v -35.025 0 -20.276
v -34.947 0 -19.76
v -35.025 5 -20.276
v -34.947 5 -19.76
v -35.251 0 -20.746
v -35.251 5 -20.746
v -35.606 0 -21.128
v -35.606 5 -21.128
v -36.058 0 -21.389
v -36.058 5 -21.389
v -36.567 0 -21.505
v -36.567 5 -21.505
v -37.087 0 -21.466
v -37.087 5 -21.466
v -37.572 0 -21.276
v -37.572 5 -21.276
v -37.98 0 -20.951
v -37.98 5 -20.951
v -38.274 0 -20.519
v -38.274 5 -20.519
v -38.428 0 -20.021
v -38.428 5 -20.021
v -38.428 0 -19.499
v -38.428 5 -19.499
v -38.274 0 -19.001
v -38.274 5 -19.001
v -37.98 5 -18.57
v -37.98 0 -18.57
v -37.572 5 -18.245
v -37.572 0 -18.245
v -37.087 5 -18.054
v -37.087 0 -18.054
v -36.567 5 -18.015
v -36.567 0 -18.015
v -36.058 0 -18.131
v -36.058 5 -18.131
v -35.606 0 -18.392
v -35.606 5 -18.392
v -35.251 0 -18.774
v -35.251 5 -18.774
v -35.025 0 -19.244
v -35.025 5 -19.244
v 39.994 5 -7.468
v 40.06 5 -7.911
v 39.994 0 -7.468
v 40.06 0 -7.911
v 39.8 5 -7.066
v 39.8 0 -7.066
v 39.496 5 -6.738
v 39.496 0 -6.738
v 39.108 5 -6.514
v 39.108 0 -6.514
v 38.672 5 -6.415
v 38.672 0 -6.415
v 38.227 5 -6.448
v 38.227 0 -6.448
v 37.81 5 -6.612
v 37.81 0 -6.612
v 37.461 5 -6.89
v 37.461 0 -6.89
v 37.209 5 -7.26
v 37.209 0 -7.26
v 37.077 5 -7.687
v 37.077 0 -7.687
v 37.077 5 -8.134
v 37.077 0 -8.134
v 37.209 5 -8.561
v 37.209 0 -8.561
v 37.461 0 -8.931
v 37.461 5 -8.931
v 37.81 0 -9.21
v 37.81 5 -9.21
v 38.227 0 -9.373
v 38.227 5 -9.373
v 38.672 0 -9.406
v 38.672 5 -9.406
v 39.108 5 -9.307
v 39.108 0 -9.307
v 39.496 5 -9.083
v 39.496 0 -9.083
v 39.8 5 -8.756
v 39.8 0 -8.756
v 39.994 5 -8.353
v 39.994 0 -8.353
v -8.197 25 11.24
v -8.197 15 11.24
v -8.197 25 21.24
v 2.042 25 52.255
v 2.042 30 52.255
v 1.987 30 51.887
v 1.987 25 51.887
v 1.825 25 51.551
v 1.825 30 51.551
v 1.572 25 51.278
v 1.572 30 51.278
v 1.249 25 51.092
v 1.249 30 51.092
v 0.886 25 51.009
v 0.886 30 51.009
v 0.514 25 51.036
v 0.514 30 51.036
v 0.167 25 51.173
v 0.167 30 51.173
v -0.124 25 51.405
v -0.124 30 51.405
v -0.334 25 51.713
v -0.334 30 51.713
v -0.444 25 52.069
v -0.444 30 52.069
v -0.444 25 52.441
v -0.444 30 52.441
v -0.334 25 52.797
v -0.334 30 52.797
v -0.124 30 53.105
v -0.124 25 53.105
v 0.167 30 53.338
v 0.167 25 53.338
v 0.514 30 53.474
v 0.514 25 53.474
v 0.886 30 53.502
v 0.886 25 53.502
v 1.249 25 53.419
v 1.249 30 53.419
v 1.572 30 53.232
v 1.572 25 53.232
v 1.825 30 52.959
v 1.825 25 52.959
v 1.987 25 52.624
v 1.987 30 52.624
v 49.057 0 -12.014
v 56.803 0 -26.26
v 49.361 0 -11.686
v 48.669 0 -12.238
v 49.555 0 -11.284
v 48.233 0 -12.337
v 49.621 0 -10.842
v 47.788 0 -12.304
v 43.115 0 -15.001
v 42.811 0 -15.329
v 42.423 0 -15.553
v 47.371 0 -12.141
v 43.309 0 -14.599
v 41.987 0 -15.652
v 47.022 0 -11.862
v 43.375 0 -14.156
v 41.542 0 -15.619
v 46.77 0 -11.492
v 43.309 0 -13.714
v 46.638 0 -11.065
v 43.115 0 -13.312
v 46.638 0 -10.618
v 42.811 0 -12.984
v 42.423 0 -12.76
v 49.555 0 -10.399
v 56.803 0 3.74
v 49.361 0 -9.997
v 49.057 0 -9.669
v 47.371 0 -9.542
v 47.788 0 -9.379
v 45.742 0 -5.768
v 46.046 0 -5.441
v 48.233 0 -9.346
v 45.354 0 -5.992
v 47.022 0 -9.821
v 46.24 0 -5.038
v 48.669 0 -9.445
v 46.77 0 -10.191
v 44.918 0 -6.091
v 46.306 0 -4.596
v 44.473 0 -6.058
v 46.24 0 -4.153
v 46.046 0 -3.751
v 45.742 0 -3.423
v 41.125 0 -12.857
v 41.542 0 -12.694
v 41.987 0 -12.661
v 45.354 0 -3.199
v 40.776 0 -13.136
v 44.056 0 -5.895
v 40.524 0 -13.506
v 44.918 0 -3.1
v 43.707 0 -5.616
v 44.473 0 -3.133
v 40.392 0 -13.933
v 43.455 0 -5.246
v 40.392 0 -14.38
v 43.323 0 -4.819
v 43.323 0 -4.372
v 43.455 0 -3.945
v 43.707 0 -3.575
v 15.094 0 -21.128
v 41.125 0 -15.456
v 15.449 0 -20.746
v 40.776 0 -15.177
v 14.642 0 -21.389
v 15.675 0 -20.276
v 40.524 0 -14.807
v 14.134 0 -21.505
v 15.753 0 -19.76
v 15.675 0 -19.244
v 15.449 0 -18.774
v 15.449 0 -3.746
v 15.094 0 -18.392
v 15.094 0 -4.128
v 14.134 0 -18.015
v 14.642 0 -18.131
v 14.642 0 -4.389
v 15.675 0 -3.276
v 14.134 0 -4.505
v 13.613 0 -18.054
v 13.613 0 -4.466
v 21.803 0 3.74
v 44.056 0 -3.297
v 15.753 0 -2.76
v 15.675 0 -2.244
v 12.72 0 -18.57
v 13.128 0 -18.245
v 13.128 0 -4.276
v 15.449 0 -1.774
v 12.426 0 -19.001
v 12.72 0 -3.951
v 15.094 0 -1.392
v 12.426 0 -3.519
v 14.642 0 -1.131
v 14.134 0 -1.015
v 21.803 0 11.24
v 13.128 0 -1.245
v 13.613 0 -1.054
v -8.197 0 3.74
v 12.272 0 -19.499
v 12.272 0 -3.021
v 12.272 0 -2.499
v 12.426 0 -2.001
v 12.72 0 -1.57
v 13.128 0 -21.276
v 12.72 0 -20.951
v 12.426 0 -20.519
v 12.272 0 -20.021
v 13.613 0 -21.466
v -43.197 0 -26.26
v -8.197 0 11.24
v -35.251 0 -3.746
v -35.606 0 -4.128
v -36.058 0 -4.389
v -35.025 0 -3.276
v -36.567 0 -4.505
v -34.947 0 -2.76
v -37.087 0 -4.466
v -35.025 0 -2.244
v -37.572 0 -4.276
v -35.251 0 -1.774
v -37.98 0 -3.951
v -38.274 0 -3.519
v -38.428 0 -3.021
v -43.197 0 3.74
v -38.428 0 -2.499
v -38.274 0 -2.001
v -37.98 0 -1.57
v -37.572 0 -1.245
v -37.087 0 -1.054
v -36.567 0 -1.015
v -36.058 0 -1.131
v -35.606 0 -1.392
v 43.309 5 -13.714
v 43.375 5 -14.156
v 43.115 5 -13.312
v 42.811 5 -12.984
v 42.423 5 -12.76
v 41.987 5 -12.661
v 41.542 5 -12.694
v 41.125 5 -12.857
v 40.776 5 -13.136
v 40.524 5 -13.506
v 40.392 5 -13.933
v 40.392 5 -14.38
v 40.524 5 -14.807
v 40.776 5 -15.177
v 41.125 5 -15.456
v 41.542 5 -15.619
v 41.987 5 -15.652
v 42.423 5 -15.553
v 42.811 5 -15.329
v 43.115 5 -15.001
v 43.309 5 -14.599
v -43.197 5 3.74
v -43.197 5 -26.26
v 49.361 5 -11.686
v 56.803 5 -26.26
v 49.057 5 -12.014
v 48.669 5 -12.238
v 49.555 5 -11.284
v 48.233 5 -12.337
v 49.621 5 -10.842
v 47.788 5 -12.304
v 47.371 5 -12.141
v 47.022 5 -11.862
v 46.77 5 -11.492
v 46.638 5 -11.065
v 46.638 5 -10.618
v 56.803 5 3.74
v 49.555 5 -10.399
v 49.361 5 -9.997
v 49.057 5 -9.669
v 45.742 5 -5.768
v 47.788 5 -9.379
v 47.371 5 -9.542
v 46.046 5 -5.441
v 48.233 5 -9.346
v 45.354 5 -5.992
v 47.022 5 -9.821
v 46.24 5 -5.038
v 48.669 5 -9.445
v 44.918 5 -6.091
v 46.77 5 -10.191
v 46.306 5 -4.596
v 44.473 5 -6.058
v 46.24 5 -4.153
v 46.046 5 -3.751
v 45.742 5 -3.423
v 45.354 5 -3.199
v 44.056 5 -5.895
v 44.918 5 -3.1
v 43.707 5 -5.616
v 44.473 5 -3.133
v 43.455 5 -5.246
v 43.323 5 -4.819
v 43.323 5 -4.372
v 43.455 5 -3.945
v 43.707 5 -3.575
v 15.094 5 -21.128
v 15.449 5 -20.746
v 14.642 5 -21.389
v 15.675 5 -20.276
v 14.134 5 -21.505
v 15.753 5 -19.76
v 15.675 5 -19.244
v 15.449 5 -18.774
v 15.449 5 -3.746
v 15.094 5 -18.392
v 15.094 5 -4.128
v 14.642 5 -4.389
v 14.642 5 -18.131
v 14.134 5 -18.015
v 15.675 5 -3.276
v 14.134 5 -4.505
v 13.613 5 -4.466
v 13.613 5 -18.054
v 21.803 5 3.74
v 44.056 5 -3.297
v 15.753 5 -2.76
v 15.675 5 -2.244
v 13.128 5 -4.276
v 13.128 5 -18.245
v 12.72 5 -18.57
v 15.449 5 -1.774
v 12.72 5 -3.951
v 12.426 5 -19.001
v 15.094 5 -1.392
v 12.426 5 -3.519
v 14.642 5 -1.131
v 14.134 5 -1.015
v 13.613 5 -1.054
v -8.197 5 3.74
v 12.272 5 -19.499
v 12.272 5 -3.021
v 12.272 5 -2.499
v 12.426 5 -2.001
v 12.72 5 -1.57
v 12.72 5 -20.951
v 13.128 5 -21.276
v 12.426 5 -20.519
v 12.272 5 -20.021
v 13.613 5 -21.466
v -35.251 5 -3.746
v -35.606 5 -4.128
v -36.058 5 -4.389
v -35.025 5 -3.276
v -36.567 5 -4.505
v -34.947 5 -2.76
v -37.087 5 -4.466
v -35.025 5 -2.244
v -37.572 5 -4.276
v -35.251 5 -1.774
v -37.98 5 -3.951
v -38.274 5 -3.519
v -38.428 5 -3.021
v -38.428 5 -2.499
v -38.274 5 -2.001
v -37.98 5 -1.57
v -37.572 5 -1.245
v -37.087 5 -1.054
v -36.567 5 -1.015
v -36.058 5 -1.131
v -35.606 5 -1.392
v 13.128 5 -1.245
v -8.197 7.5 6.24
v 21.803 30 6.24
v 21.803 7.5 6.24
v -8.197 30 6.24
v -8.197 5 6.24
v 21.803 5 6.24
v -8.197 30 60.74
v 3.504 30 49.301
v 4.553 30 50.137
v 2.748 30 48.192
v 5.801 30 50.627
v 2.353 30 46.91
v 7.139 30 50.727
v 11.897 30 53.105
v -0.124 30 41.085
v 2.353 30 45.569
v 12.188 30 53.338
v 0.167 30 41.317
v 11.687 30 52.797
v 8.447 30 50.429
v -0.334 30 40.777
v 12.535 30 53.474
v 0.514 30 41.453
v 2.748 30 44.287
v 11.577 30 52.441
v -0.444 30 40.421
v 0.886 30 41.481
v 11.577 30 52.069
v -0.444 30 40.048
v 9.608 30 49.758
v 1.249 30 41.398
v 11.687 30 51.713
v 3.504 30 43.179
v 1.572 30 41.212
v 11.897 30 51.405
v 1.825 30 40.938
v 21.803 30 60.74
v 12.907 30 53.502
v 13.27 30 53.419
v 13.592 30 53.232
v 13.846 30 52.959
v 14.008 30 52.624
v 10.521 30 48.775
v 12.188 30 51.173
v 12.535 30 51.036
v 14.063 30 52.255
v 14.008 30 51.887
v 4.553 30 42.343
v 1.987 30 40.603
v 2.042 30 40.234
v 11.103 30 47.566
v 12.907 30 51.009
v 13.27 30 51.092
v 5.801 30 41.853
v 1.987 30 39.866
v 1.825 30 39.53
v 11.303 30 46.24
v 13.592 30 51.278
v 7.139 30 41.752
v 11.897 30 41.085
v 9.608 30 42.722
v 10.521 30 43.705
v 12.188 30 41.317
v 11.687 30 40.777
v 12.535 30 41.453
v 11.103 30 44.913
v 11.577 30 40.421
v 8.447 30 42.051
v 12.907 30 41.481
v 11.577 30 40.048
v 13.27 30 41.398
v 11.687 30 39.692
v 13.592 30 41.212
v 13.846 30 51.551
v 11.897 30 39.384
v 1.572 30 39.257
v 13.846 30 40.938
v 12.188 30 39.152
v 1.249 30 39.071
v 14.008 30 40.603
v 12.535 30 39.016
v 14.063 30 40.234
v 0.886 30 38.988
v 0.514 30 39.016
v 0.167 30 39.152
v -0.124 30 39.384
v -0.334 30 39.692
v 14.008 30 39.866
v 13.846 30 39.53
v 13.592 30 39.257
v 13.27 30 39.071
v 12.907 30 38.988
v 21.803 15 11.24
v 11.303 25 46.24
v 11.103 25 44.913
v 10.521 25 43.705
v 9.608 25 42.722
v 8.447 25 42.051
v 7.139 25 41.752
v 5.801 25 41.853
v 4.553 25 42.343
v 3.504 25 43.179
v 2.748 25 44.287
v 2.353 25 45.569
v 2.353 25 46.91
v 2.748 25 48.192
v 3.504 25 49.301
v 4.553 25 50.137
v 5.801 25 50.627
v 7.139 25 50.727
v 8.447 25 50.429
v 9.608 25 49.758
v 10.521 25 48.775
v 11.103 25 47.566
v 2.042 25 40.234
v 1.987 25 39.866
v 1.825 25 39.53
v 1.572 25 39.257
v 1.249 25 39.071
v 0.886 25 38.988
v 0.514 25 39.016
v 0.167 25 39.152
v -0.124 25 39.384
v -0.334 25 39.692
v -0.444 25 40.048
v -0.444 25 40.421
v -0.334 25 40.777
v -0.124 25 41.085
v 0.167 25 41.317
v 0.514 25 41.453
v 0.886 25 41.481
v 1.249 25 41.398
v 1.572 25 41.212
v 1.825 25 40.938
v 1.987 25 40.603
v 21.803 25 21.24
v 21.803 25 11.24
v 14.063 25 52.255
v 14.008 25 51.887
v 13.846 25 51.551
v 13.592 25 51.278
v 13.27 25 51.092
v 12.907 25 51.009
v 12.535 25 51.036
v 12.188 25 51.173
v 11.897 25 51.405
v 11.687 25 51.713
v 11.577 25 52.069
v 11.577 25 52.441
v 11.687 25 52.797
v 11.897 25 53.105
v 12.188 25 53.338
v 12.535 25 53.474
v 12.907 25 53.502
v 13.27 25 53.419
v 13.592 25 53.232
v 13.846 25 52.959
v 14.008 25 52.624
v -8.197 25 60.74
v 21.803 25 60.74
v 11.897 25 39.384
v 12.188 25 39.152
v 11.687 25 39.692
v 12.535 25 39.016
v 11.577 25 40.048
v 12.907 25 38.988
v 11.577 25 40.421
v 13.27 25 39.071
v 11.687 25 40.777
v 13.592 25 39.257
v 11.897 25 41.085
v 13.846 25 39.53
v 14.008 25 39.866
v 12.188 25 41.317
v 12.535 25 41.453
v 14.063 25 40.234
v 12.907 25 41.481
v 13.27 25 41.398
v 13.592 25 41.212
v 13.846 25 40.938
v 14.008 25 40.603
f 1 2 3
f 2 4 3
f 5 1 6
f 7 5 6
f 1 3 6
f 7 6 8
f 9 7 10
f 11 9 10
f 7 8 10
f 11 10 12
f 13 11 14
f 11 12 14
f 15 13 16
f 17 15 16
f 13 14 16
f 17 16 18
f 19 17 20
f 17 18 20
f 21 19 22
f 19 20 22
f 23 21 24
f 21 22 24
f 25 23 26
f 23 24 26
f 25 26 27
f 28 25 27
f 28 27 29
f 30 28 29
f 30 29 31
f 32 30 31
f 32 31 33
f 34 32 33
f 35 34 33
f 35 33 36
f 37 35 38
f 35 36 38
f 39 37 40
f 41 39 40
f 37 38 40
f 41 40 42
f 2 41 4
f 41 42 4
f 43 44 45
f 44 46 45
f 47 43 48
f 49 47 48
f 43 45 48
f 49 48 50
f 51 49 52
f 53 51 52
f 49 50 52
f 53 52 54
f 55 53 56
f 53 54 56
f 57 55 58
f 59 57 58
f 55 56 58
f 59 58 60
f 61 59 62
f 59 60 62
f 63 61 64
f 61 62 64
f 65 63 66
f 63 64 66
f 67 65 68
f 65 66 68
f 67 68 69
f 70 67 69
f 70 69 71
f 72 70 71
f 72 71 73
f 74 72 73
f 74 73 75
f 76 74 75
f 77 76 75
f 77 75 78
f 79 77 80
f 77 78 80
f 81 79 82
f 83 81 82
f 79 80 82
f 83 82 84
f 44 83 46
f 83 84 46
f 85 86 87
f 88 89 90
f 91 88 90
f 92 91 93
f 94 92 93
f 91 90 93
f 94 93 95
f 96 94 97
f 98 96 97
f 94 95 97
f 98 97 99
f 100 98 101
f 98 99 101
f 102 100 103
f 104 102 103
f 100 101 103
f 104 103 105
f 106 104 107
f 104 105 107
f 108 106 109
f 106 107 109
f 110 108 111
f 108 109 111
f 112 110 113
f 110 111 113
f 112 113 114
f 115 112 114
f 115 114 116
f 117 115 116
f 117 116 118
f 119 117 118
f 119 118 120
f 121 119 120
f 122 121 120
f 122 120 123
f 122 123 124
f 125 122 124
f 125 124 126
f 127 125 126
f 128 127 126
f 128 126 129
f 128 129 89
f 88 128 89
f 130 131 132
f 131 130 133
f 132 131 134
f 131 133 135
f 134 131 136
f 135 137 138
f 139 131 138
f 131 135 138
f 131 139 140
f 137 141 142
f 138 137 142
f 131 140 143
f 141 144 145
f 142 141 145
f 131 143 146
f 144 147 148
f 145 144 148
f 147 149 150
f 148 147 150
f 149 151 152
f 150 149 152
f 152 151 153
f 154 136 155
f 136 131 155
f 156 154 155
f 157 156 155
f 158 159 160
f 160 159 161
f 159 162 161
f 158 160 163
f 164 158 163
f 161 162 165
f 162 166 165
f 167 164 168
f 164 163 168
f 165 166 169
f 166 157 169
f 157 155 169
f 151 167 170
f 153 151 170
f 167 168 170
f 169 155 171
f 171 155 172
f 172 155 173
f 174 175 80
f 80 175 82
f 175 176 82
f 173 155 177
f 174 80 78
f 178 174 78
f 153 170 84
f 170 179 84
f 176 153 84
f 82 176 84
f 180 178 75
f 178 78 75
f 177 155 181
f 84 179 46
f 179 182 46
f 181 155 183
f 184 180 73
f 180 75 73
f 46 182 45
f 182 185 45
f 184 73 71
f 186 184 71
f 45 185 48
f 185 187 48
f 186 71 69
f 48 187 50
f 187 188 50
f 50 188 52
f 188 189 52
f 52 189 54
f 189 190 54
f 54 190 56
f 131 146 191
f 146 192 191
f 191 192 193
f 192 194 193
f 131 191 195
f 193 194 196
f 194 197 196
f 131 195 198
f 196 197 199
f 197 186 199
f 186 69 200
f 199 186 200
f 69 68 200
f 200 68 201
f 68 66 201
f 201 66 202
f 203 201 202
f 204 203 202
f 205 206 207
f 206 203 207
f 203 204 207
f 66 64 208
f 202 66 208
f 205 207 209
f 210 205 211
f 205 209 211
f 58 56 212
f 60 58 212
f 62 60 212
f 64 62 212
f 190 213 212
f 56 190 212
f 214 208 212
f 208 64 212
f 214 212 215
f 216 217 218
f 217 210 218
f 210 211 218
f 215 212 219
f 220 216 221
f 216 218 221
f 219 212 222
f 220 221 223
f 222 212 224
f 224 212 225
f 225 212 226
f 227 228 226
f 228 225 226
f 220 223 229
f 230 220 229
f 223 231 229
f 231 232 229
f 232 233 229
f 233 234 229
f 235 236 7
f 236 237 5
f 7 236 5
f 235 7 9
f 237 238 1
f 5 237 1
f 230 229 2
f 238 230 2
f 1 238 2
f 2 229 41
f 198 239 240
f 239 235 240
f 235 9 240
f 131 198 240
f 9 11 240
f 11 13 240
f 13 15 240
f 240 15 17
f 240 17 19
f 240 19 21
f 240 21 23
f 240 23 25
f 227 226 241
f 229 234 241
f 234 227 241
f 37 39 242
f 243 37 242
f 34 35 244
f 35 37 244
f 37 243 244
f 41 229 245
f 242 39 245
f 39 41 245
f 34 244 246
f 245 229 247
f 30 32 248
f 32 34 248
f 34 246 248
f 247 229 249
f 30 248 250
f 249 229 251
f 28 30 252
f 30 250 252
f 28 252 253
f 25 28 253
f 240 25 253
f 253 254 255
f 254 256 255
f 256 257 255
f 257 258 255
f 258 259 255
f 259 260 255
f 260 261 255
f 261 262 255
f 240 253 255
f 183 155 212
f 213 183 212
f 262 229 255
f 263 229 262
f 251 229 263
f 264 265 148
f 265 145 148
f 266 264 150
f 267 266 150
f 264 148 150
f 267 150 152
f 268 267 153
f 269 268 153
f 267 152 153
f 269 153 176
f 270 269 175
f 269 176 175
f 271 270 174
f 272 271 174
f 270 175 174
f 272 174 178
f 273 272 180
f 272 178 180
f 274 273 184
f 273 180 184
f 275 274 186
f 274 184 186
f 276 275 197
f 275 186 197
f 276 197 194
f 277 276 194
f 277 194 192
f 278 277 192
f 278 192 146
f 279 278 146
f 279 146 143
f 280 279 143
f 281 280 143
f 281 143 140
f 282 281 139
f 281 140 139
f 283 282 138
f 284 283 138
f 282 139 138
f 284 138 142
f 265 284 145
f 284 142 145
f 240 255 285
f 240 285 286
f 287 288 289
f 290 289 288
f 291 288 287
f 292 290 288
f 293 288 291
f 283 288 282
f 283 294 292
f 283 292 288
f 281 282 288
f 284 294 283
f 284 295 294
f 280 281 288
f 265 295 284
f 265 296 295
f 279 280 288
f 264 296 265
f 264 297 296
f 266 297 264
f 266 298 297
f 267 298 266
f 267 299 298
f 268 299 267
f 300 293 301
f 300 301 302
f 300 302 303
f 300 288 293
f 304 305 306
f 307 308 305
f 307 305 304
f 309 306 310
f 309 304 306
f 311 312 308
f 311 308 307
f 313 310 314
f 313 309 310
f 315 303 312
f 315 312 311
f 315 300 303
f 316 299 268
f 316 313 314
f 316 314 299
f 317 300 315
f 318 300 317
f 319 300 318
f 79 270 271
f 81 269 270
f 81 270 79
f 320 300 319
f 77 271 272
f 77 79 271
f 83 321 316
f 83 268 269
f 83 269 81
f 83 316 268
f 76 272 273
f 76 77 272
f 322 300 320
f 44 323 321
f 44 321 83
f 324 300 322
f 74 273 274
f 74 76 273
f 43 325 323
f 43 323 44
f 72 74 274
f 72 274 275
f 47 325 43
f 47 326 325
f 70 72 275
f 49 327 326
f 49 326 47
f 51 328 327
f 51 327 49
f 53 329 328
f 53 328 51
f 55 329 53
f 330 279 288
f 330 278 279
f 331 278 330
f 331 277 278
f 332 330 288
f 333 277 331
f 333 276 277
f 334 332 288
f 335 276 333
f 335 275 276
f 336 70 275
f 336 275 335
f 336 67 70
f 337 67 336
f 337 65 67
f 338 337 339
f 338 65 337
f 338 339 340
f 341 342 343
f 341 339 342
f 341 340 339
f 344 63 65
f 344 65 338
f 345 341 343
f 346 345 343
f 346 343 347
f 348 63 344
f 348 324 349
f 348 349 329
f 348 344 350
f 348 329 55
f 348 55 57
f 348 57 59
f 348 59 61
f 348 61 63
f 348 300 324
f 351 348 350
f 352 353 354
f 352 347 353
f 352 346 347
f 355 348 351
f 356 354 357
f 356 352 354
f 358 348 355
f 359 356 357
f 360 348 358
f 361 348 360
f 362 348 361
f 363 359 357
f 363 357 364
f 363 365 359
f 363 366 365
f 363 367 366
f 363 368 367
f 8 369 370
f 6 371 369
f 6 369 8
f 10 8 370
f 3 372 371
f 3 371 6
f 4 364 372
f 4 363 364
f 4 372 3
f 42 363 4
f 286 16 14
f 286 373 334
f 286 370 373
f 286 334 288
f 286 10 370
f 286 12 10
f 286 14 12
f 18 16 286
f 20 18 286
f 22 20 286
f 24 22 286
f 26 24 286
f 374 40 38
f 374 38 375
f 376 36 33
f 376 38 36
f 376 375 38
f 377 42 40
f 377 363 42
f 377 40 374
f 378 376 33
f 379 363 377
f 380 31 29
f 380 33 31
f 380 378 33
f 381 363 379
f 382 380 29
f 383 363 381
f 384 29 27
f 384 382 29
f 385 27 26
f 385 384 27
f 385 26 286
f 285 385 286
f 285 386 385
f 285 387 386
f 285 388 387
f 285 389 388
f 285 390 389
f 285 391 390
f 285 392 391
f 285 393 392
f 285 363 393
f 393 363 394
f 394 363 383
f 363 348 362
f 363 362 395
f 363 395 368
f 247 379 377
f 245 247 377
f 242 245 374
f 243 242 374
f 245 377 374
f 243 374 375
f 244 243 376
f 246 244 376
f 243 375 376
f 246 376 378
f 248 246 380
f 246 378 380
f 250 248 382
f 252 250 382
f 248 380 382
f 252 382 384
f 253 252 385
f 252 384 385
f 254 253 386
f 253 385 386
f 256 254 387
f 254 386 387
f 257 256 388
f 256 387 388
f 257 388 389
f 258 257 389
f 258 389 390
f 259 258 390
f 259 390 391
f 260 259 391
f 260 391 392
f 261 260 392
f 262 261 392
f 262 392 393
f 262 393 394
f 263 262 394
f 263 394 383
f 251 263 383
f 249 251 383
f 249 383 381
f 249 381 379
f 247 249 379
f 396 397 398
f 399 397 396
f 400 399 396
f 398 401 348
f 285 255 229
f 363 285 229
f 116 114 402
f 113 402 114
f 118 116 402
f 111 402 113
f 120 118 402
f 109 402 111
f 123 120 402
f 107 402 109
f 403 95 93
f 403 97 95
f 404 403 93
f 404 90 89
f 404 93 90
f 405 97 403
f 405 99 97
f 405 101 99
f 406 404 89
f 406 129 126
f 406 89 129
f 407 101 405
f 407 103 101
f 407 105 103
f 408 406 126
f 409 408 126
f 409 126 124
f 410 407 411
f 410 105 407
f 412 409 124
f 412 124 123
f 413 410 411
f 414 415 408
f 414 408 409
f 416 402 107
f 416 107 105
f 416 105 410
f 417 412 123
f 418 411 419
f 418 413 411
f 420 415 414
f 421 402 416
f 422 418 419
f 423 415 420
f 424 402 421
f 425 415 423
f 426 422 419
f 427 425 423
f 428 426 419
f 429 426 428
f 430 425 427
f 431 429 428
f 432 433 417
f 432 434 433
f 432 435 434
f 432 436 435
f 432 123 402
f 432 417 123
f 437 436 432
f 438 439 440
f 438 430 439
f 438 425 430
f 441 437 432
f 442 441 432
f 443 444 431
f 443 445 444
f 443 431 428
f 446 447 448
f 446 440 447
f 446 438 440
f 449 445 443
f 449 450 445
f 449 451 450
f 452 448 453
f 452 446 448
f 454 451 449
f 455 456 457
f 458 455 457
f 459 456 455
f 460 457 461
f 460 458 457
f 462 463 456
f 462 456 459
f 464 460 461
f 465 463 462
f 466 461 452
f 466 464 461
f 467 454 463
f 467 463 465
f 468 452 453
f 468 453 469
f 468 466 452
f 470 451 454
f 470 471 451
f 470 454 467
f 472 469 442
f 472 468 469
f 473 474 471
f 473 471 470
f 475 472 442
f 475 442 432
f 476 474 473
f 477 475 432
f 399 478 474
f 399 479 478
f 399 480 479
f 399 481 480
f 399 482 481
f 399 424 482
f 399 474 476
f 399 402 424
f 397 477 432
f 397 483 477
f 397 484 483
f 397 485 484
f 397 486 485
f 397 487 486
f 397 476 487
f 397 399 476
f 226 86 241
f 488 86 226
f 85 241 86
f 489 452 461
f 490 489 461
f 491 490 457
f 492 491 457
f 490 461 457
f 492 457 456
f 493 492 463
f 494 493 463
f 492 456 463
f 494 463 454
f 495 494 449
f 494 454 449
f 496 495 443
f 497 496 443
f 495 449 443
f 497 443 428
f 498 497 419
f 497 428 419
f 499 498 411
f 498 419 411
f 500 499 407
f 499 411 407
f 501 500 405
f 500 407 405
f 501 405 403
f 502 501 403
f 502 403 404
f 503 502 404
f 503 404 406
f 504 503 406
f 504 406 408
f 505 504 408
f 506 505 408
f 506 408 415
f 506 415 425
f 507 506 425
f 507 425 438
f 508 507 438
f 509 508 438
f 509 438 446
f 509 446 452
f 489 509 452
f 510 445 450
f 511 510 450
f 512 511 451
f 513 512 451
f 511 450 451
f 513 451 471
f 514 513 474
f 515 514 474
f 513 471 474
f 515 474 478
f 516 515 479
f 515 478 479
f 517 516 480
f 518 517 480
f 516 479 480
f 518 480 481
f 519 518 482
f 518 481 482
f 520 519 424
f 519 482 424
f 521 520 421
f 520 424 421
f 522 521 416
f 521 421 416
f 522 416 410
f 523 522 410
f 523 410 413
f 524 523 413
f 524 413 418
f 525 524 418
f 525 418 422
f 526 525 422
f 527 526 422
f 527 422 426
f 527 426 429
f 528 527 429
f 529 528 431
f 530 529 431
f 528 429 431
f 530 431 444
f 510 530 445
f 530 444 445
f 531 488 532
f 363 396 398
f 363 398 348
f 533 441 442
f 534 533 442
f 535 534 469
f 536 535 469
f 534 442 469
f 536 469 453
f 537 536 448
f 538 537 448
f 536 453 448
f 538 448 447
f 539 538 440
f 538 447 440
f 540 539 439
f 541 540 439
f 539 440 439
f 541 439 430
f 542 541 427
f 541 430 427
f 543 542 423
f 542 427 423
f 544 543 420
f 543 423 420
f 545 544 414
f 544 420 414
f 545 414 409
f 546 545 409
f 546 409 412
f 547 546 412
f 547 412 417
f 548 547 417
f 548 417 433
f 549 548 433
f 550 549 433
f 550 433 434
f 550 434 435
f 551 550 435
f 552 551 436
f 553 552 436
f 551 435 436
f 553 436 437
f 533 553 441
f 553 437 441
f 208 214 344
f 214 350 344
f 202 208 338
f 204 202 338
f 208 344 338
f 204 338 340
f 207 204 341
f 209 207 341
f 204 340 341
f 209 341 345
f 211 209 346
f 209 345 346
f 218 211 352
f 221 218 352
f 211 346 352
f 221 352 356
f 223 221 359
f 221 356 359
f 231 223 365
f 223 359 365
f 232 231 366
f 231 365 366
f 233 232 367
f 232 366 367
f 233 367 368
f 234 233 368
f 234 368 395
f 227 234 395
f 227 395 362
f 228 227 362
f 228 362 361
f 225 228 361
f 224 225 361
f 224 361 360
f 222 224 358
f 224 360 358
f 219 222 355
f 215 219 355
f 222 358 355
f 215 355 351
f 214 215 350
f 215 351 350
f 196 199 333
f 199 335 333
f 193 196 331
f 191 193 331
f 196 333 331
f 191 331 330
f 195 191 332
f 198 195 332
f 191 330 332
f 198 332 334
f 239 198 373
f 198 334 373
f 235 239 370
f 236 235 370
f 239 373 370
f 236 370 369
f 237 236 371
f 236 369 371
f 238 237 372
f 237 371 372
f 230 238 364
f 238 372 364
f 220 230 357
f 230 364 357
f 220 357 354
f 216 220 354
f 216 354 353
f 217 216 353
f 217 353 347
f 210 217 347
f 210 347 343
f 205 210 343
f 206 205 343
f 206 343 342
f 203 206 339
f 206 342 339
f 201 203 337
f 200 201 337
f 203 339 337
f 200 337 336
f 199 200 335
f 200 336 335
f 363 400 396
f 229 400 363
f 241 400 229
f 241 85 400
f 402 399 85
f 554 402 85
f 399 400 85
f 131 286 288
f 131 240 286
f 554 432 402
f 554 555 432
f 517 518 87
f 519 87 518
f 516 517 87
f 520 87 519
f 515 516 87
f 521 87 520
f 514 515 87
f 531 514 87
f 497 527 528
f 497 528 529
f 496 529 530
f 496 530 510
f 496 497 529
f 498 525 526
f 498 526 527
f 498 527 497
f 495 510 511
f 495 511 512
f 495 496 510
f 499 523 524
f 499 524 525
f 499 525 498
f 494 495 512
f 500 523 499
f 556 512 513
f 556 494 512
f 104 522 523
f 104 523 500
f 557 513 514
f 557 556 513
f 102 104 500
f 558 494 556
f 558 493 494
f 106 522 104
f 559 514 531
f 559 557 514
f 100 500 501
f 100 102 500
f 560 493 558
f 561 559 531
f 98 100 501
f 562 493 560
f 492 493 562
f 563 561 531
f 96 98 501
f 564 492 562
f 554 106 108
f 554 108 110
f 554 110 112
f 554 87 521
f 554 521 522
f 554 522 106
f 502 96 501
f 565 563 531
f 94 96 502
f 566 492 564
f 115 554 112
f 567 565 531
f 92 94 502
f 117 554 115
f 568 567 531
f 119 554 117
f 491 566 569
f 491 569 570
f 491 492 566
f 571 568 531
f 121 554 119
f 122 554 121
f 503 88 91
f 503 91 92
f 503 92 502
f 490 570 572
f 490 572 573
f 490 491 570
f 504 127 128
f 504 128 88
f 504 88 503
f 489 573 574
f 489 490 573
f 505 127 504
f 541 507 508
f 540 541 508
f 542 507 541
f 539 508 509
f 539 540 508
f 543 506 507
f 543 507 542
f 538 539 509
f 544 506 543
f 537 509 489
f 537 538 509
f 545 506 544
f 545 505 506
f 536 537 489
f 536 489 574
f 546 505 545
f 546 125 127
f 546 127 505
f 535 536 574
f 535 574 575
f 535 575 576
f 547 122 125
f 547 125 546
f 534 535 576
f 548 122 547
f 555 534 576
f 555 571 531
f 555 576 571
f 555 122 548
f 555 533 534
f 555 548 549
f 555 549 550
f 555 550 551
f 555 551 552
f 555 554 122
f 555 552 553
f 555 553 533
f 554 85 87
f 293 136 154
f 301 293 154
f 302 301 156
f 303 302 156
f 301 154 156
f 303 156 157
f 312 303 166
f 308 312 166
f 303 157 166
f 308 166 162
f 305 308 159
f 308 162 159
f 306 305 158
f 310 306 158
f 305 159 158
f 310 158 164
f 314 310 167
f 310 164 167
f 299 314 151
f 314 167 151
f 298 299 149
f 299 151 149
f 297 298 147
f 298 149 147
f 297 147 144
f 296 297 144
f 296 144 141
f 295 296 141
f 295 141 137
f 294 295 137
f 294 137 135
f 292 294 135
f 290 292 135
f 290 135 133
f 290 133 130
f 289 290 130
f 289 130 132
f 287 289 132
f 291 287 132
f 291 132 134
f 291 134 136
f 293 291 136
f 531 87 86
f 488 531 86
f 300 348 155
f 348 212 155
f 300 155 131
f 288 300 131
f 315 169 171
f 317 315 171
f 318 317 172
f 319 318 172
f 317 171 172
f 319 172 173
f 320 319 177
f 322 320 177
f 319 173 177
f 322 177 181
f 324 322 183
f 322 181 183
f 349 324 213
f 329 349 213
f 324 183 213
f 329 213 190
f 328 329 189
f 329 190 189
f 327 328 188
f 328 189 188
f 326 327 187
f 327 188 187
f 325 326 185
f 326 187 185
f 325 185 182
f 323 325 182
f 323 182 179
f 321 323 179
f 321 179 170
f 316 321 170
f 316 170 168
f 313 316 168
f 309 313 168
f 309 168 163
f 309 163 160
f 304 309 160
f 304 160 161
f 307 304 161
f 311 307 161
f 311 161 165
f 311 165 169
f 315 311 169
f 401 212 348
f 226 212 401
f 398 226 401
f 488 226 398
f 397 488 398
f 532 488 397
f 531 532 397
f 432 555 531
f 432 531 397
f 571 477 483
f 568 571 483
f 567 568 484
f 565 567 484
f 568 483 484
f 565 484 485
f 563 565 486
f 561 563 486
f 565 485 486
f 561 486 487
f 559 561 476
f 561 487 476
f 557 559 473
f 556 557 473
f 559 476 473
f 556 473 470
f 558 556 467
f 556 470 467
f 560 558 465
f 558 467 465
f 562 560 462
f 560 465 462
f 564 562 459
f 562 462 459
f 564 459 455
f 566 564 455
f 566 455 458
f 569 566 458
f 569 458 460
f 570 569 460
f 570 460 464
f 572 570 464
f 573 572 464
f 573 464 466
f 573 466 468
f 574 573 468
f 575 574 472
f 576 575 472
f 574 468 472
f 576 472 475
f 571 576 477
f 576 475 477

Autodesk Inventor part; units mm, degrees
sketch "Sketch1" plane through (0, 0, 0) normal (0, 1, 0) x (-1, 0, 0)
  line L0 (43.1973, 3.7398) -> (-56.8027, 3.7398)
  line L1 (-56.8027, 3.7398) -> (-56.8027, -26.2602)
  line L2 (43.1973, 3.7398) -> (43.1973, -26.2602)
  line L3 (-21.8027, -26.2602) -> (8.1973, -26.2602)
  line L4 (43.1973, -26.2602) -> (8.1973, -26.2602)
  line L5 (-21.8027, -26.2602) -> (-56.8027, -26.2602)
  line L6 (-21.8027, 3.7398) -> (8.1973, 3.7398)
  point P0 (0, 0)
  dimension "d2" = 100
  dimension "d6" = 30
extrude "Extrusion1" add sketch "Sketch1" along normal blind 5
sketch "Sketch4" plane through (0, 5, 0) normal (0, 1, 0) x (1, 0, 0)
  circle A0 centre (-36.6973, 2.7602) radius 1.75 projected
  circle A1 centre (-36.6973, 19.7602) radius 1.75 projected
  circle A2 centre (14.0028, 2.7602) radius 1.75 projected
  circle A3 centre (14.0028, 19.7602) radius 1.75 projected
  point P0 (0, 0)
extrude "Extrusion3" cut sketch "Sketch4" against normal through all
sketch "Sketch5" plane through (0, 0, 0) normal (0, -1, 0) x (1, 0, 0)
  circle A0 centre (41.8754, -14.1565) radius 1.5
  circle A1 centre (48.1213, -10.8415) radius 1.5
  circle A2 centre (44.8063, -4.5956) radius 1.5
  circle A3 centre (38.5604, -7.9106) radius 1.5
  line L0 (44.8063, -4.5956) -> (48.1213, -10.8415) construction
  line L1 (48.1213, -10.8415) -> (41.8754, -14.1565) construction
  line L2 (41.8754, -14.1565) -> (38.5604, -7.9106) construction
  line L3 (38.5604, -7.9106) -> (44.8063, -4.5956) construction
  line L4 (44.8063, -4.5956) -> (41.8754, -14.1565) construction
  line L5 (48.1213, -10.8415) -> (38.5604, -7.9106) construction
  line L6 (43.3409, -9.376) -> (52.1686, -4.6925)
  point P0 (0, 0)
  dimension "d47" = 3
  dimension "d48" = 3
  dimension "d49" = 3
  dimension "d50" = 3
  dimension "d51" = 3.315
  dimension "d52" = 3.315
  dimension "d53" = 7.0711
  dimension "d54" = 7.0711
  dimension "d55" = 7.0711
  dimension "d56" = 7.0711
extrude "Extrusion4" cut sketch "Sketch5" against normal up to next
sketch "Sketch6" plane through (0, 0, 0) normal (0, -1, 0) x (1, 0, 0)
  circle A0 centre (6.7527, 80.0276) radius 4.235 projected
  circle A1 centre (6.7527, 80.0276) radius 4.8512
  point P0 (0, 0)
  dimension "d19" = 0.6162
sketch "Sketch7" plane through (-43.1973, 0, 3.7398) normal (0, 0, 1) x (1, 0, 0)
  line L0 (0, 0) -> (100, 0) projected
  line L1 (100, 0) -> (100, 5) projected
  line L2 (0, 5) -> (100, 5) projected
  line L3 (0, 0) -> (0, 5) projected
  line L4 (65, 0) -> (35, 0)
  line L5 (35, 0) -> (35, 5)
  line L6 (35, 5) -> (65, 5)
  line L7 (65, 5) -> (65, 0)
  line L8 (65, 0) -> (35, 5) construction
  line L9 (35, 0) -> (65, 5) construction
  point P0 (43.1973, 0)
  point P1 (50, 2.5)
  dimension "d22" = 30
  dimension "d23" = 5
  dimension "d24" = 6.8027
  dimension "d57" = 0
ref_plane "Work Plane2" through (6.8027, 0, 0) normal (1, 0, 0) x (0, 1, 0)
sketch "Sketch9" plane through (6.8027, 0, 0) normal (1, 0, 0) x (0, 1, 0)
  line L0 (2.5, 3.7398) -> (2.5, 8.7398)
  line L1 (2.5, 3.7398) -> (7.5, 3.7398) construction
  line L2 (2.5, 8.7398) -> (27.5, 8.7398)
  line L3 (27.5, 8.7398) -> (27.5, 88.7398)
  point P0 (0, 0)
  dimension "d26" = 5
  dimension "d27" = 90
  dimension "d28" = 25
  dimension "d29" = 80
sweep "Sweep1" add profiles "Sketch7" path "Sketch9" contours L5 L2 L7 L0
ref_plane "YZ 0" through (6.803, 0, 0) normal (1, 0, 0) x (0, 1, 0)
ref_plane "XY 0" through (0, 0, -11.25) normal (0, 0, 1) x (1, 0, 0)
sketch "Sketch12" plane through (-8.1973, 25, 11.2398) normal (0, -1, 0) x (1, 0, 0)
  circle A0 centre (15.0003, 42.485) radius 1.11
  point P0 (8.1973, -11.2398)
extrude "Extrusion8" cut sketch "Sketch12" against normal up to next
sketch "Sketch13" plane through (-8.1973, 30, 6.2398) normal (0, 1, 0) x (1, 0, 0)
  circle A0 centre (15.0003, -45.985) radius 1.4
  point P0 (8.1973, 6.2398)
extrude "Extrusion9" cut sketch "Sketch13" against normal up to next
sketch "Sketch15" plane through (-8.1973, 30, 6.2398) normal (0, 1, 0) x (1, 0, 0)
  circle A0 centre (15, -40) radius 4.5
  point P0 (8.1973, 6.2398)
  dimension "d40" = 9
extrude "Extrusion10" cut sketch "Sketch15" against normal up to next
sketch "Sketch16" plane through (-8.1973, 25, 11.2398) normal (0, -1, 0) x (1, 0, 0)
  circle A0 centre (15, 42.5) radius 12
  line L0 (30, 0) -> (30, 77.5) projected
  line L1 (0, 0) -> (0, 77.5) projected
  line L2 (30, 77.5) -> (0, 77.5)
  line L3 (0, 77.5) -> (0, 57.5)
  line L4 (0, 57.5) -> (30, 57.5)
  line L5 (30, 57.5) -> (30, 77.5)
  point P0 (8.1973, -11.2398)
  point P1 (15, 57.5)
  dimension "d43" = 15
  dimension "d44" = 15
extrude "Extrusion11" cut sketch "Sketch16" against normal up to next contours L4 L1 L2 L0
sketch "Sketch17" plane through (-8.1973, 30, 6.2398) normal (0, 1, 0) x (1, 0, 0)
  circle A0 centre (8.9896, -46.0153) radius 1.25
  circle A1 centre (8.9896, -33.9945) radius 1.25
  circle A2 centre (21.0104, -46.0153) radius 1.25
  circle A3 centre (21.0104, -33.9945) radius 1.25
  line L0 (8.9896, -46.0153) -> (8.9896, -33.9945) construction
  line L1 (8.9896, -33.9945) -> (21.0104, -33.9945) construction
  line L2 (21.0104, -33.9945) -> (21.0104, -46.0153) construction
  line L3 (21.0104, -46.0153) -> (8.9896, -46.0153) construction
  line L4 (21.0104, -33.9945) -> (8.9896, -46.0153) construction
  line L5 (8.9896, -33.9945) -> (21.0104, -46.0153) construction
  line L6 (0, -62.5) -> (30, -62.5) construction
  line L7 (0, 0) -> (0, -62.5) construction
  line L8 (30, 0) -> (30, -62.5) construction
  point P0 (8.1973, 6.2398)
  dimension "d64" = 12.0208
  dimension "d65" = 12.0208
  dimension "d66" = 12.0208
  dimension "d67" = 12.0208
  dimension "d68" = 17
  dimension "d69" = 17
  dimension "d70" = 2.5
  dimension "d71" = 2.5
  dimension "d72" = 2.5
  dimension "d73" = 2.5
extrude "Extrusion12" cut sketch "Sketch17" against normal up to next
sketch "Sketch18" plane through (6.803, 0, 0) normal (1, 0, 0) x (0, 1, 0)
  line L0 (25, 11.2398) -> (15, 11.2398)
  line L1 (0, 11.2398) -> (25, 11.2398) projected
  line L2 (25, 11.2398) -> (25, 21.2398)
  line L3 (25, 11.2398) -> (25, 68.7398) projected
  line L4 (25, 21.2398) -> (15, 11.2398)
  point P0 (0, 0)
  dimension "d76" = 10
  dimension "d79" = 10
extrude "Extrusion13" add sketch "Sketch18" along normal mid plane 30
sketch "Sketch19" plane through (6.803, 0, 0) normal (1, 0, 0) x (0, 1, 0)
  line L0 (5, 6.2398) -> (7.5, 6.2398)
  line L1 (5, 6.2398) -> (30, 6.2398) projected
  line L2 (5, 6.2398) -> (7.5, 6.2398) construction
  line L3 (7.5, 6.2398) -> (5, 3.7398)
  line L4 (5, 3.7398) -> (5, 6.2398)
  point P0 (0, 0)
  dimension "d80" = 2.5
  dimension "d81" = 0
  dimension "d82" = 45
extrude "Extrusion14" add sketch "Sketch19" along normal mid plane 30
sketch "Sketch20" plane through (-8.1973, 30, 6.2398) normal (0, 1, 0) x (1, 0, 0)
  circle A0 centre (15, -40) radius 4.5 projected
  arc A1 (15.9875, -46.9776) -> (14.013, -46.9776) centre (15.0003, -45.985) ccw projected
  arc A2 (14.013, -46.9776) -> (15.9875, -46.9776) centre (15.0003, -47.485) ccw projected
  point P0 (8.1973, 6.2398)
extrude "Extrusion15" add sketch "Sketch20" against normal blind 5 contours A2 A1
sketch "Sketch21" plane through (-8.1973, 25, 68.7398) normal (0, -1, 0) x (1, 0, 0)
  line L0 (30, -47.5) -> (30, 0) projected
  line L1 (0, 0) -> (30, 0)
  line L2 (30, 0) -> (30, -8)
  line L3 (30, -8) -> (0, -8)
  line L4 (0, -8) -> (0, 0)
  point P0 (8.1973, -68.7398)
extrude "Extrusion16" cut sketch "Sketch21" against normal through all
equation "\"d71\" = d70"
equation "\"d72\" = d70"
equation "\"d73\" = d70"
properties part number "DudukanExt"
